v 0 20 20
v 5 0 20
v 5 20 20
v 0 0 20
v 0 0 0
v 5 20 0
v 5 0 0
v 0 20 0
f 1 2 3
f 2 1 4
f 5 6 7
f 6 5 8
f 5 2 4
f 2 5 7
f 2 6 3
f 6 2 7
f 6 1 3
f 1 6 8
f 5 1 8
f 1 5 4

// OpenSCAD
// SYMPTOM: resize() with auto-scaling diverged from OpenSCAD whenever an auto
//   axis had newsize 0 (or when an axis was BOTH auto AND had its own explicit
//   newsize). e.g. resize([5,0,20], auto=[false,true,true]) cube([9,9,9])
//   imported as volume 125 (5x5x5) instead of OpenSCAD's 2000 (5x20x20). The
//   dominant residual of t3d__resize-tests / t2d__resize-2d-tests. Previously
//   mis-parked as "implementation-defined / UNKNOWN" -- it is NOT: OpenSCAD's
//   rule is concrete and deterministic.
// CAUSE: importCSG.p_resize_action did `if auto[r]: new_size[r] = new_size[0]`,
//   i.e. it set every auto axis's target to the X target value, and clobbered an
//   axis that already had an explicit newsize. OpenSCAD instead scales each auto
//   axis by an "autoscale" factor = the MAX of the explicit per-axis factors.
// FIX: importCSG.py p_resize_action -> compute factor[i]=newsize[i]/old[i] for
//   axes with newsize>0; autoscale = max of those; an auto axis with newsize 0
//   takes autoscale; non-auto newsize<=0 and zero-extent axes stay unchanged.
//   Commit <pending>.
// EXPECTED (OpenSCAD 2021.01, verified by STL render on cube([9,9,9])):
//   [5,0,0]  auto[T,T,F] -> 5,5,9   = 225  (y follows x's 5/9)
//   [5,0,20] auto[F,T,T] -> 5,20,20 = 2000 (y follows max(5/9,20/9)=20/9; z=20)
//   [6,0,0]  auto[T,T,T] -> 6,6,6   = 216  (uniform)
resize([5, 0, 20], auto = [false, true, true])
	cube([9, 9, 9]);
